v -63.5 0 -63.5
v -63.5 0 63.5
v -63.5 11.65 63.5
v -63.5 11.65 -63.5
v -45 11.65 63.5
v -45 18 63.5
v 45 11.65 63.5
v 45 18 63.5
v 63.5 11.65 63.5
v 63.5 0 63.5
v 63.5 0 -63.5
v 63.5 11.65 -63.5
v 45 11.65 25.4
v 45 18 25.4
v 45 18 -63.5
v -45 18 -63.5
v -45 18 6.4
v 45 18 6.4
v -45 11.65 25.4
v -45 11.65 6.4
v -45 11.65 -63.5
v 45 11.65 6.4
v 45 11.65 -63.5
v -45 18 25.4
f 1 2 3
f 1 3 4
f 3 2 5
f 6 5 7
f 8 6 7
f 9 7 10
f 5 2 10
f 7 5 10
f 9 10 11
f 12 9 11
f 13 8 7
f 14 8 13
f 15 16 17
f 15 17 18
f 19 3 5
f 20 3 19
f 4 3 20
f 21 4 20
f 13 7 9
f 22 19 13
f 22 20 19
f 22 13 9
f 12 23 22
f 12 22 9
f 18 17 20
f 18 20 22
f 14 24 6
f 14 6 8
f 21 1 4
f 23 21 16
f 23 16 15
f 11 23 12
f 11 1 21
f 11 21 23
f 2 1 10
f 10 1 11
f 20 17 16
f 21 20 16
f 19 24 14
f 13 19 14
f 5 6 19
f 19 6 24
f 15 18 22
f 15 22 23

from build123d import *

# Parameters (mm, degrees)
SKETCH1_W           = 127
SKETCH1_H           = 127
BOSS_EXTRUDE1_DEPTH = 18
SKETCH2_W           = 127
SKETCH2_H           = 19
CUT_EXTRUDE1_DEPTH  = 6.35
SKETCH3_W           = 18.5
SKETCH3_H           = 127
CUT_EXTRUDE2_DEPTH  = 6.35


with BuildPart() as part:
    # Sketch1 → Boss-Extrude1 (new body)
    with BuildSketch(Plane(origin=(0, 0, 0), x_dir=(1, 0, 0), z_dir=(0, 1, 0))):
        Rectangle(SKETCH1_W, SKETCH1_H)
    extrude(amount=BOSS_EXTRUDE1_DEPTH)

    # Sketch2 → Cut-Extrude1 (cut)
    with BuildSketch(Plane(origin=(0, 18, 0), x_dir=(1, 0, 0), z_dir=(0, 1, 0))):
        with Locations((0, -15.9)):
            Rectangle(SKETCH2_W, SKETCH2_H)
    extrude(amount=-CUT_EXTRUDE1_DEPTH, mode=Mode.SUBTRACT)

    # Sketch3 → Cut-Extrude2 (cut)
    with BuildSketch(Plane(origin=(0, 18, 0), x_dir=(1, 0, 0), z_dir=(0, 1, 0))):
        with Locations((54.25, 0)):
            Rectangle(SKETCH3_W, SKETCH3_H)
        with Locations((-54.25, 0)):
            Rectangle(SKETCH3_W, SKETCH3_H)
    extrude(amount=-CUT_EXTRUDE2_DEPTH, mode=Mode.SUBTRACT)


solid = part.part
